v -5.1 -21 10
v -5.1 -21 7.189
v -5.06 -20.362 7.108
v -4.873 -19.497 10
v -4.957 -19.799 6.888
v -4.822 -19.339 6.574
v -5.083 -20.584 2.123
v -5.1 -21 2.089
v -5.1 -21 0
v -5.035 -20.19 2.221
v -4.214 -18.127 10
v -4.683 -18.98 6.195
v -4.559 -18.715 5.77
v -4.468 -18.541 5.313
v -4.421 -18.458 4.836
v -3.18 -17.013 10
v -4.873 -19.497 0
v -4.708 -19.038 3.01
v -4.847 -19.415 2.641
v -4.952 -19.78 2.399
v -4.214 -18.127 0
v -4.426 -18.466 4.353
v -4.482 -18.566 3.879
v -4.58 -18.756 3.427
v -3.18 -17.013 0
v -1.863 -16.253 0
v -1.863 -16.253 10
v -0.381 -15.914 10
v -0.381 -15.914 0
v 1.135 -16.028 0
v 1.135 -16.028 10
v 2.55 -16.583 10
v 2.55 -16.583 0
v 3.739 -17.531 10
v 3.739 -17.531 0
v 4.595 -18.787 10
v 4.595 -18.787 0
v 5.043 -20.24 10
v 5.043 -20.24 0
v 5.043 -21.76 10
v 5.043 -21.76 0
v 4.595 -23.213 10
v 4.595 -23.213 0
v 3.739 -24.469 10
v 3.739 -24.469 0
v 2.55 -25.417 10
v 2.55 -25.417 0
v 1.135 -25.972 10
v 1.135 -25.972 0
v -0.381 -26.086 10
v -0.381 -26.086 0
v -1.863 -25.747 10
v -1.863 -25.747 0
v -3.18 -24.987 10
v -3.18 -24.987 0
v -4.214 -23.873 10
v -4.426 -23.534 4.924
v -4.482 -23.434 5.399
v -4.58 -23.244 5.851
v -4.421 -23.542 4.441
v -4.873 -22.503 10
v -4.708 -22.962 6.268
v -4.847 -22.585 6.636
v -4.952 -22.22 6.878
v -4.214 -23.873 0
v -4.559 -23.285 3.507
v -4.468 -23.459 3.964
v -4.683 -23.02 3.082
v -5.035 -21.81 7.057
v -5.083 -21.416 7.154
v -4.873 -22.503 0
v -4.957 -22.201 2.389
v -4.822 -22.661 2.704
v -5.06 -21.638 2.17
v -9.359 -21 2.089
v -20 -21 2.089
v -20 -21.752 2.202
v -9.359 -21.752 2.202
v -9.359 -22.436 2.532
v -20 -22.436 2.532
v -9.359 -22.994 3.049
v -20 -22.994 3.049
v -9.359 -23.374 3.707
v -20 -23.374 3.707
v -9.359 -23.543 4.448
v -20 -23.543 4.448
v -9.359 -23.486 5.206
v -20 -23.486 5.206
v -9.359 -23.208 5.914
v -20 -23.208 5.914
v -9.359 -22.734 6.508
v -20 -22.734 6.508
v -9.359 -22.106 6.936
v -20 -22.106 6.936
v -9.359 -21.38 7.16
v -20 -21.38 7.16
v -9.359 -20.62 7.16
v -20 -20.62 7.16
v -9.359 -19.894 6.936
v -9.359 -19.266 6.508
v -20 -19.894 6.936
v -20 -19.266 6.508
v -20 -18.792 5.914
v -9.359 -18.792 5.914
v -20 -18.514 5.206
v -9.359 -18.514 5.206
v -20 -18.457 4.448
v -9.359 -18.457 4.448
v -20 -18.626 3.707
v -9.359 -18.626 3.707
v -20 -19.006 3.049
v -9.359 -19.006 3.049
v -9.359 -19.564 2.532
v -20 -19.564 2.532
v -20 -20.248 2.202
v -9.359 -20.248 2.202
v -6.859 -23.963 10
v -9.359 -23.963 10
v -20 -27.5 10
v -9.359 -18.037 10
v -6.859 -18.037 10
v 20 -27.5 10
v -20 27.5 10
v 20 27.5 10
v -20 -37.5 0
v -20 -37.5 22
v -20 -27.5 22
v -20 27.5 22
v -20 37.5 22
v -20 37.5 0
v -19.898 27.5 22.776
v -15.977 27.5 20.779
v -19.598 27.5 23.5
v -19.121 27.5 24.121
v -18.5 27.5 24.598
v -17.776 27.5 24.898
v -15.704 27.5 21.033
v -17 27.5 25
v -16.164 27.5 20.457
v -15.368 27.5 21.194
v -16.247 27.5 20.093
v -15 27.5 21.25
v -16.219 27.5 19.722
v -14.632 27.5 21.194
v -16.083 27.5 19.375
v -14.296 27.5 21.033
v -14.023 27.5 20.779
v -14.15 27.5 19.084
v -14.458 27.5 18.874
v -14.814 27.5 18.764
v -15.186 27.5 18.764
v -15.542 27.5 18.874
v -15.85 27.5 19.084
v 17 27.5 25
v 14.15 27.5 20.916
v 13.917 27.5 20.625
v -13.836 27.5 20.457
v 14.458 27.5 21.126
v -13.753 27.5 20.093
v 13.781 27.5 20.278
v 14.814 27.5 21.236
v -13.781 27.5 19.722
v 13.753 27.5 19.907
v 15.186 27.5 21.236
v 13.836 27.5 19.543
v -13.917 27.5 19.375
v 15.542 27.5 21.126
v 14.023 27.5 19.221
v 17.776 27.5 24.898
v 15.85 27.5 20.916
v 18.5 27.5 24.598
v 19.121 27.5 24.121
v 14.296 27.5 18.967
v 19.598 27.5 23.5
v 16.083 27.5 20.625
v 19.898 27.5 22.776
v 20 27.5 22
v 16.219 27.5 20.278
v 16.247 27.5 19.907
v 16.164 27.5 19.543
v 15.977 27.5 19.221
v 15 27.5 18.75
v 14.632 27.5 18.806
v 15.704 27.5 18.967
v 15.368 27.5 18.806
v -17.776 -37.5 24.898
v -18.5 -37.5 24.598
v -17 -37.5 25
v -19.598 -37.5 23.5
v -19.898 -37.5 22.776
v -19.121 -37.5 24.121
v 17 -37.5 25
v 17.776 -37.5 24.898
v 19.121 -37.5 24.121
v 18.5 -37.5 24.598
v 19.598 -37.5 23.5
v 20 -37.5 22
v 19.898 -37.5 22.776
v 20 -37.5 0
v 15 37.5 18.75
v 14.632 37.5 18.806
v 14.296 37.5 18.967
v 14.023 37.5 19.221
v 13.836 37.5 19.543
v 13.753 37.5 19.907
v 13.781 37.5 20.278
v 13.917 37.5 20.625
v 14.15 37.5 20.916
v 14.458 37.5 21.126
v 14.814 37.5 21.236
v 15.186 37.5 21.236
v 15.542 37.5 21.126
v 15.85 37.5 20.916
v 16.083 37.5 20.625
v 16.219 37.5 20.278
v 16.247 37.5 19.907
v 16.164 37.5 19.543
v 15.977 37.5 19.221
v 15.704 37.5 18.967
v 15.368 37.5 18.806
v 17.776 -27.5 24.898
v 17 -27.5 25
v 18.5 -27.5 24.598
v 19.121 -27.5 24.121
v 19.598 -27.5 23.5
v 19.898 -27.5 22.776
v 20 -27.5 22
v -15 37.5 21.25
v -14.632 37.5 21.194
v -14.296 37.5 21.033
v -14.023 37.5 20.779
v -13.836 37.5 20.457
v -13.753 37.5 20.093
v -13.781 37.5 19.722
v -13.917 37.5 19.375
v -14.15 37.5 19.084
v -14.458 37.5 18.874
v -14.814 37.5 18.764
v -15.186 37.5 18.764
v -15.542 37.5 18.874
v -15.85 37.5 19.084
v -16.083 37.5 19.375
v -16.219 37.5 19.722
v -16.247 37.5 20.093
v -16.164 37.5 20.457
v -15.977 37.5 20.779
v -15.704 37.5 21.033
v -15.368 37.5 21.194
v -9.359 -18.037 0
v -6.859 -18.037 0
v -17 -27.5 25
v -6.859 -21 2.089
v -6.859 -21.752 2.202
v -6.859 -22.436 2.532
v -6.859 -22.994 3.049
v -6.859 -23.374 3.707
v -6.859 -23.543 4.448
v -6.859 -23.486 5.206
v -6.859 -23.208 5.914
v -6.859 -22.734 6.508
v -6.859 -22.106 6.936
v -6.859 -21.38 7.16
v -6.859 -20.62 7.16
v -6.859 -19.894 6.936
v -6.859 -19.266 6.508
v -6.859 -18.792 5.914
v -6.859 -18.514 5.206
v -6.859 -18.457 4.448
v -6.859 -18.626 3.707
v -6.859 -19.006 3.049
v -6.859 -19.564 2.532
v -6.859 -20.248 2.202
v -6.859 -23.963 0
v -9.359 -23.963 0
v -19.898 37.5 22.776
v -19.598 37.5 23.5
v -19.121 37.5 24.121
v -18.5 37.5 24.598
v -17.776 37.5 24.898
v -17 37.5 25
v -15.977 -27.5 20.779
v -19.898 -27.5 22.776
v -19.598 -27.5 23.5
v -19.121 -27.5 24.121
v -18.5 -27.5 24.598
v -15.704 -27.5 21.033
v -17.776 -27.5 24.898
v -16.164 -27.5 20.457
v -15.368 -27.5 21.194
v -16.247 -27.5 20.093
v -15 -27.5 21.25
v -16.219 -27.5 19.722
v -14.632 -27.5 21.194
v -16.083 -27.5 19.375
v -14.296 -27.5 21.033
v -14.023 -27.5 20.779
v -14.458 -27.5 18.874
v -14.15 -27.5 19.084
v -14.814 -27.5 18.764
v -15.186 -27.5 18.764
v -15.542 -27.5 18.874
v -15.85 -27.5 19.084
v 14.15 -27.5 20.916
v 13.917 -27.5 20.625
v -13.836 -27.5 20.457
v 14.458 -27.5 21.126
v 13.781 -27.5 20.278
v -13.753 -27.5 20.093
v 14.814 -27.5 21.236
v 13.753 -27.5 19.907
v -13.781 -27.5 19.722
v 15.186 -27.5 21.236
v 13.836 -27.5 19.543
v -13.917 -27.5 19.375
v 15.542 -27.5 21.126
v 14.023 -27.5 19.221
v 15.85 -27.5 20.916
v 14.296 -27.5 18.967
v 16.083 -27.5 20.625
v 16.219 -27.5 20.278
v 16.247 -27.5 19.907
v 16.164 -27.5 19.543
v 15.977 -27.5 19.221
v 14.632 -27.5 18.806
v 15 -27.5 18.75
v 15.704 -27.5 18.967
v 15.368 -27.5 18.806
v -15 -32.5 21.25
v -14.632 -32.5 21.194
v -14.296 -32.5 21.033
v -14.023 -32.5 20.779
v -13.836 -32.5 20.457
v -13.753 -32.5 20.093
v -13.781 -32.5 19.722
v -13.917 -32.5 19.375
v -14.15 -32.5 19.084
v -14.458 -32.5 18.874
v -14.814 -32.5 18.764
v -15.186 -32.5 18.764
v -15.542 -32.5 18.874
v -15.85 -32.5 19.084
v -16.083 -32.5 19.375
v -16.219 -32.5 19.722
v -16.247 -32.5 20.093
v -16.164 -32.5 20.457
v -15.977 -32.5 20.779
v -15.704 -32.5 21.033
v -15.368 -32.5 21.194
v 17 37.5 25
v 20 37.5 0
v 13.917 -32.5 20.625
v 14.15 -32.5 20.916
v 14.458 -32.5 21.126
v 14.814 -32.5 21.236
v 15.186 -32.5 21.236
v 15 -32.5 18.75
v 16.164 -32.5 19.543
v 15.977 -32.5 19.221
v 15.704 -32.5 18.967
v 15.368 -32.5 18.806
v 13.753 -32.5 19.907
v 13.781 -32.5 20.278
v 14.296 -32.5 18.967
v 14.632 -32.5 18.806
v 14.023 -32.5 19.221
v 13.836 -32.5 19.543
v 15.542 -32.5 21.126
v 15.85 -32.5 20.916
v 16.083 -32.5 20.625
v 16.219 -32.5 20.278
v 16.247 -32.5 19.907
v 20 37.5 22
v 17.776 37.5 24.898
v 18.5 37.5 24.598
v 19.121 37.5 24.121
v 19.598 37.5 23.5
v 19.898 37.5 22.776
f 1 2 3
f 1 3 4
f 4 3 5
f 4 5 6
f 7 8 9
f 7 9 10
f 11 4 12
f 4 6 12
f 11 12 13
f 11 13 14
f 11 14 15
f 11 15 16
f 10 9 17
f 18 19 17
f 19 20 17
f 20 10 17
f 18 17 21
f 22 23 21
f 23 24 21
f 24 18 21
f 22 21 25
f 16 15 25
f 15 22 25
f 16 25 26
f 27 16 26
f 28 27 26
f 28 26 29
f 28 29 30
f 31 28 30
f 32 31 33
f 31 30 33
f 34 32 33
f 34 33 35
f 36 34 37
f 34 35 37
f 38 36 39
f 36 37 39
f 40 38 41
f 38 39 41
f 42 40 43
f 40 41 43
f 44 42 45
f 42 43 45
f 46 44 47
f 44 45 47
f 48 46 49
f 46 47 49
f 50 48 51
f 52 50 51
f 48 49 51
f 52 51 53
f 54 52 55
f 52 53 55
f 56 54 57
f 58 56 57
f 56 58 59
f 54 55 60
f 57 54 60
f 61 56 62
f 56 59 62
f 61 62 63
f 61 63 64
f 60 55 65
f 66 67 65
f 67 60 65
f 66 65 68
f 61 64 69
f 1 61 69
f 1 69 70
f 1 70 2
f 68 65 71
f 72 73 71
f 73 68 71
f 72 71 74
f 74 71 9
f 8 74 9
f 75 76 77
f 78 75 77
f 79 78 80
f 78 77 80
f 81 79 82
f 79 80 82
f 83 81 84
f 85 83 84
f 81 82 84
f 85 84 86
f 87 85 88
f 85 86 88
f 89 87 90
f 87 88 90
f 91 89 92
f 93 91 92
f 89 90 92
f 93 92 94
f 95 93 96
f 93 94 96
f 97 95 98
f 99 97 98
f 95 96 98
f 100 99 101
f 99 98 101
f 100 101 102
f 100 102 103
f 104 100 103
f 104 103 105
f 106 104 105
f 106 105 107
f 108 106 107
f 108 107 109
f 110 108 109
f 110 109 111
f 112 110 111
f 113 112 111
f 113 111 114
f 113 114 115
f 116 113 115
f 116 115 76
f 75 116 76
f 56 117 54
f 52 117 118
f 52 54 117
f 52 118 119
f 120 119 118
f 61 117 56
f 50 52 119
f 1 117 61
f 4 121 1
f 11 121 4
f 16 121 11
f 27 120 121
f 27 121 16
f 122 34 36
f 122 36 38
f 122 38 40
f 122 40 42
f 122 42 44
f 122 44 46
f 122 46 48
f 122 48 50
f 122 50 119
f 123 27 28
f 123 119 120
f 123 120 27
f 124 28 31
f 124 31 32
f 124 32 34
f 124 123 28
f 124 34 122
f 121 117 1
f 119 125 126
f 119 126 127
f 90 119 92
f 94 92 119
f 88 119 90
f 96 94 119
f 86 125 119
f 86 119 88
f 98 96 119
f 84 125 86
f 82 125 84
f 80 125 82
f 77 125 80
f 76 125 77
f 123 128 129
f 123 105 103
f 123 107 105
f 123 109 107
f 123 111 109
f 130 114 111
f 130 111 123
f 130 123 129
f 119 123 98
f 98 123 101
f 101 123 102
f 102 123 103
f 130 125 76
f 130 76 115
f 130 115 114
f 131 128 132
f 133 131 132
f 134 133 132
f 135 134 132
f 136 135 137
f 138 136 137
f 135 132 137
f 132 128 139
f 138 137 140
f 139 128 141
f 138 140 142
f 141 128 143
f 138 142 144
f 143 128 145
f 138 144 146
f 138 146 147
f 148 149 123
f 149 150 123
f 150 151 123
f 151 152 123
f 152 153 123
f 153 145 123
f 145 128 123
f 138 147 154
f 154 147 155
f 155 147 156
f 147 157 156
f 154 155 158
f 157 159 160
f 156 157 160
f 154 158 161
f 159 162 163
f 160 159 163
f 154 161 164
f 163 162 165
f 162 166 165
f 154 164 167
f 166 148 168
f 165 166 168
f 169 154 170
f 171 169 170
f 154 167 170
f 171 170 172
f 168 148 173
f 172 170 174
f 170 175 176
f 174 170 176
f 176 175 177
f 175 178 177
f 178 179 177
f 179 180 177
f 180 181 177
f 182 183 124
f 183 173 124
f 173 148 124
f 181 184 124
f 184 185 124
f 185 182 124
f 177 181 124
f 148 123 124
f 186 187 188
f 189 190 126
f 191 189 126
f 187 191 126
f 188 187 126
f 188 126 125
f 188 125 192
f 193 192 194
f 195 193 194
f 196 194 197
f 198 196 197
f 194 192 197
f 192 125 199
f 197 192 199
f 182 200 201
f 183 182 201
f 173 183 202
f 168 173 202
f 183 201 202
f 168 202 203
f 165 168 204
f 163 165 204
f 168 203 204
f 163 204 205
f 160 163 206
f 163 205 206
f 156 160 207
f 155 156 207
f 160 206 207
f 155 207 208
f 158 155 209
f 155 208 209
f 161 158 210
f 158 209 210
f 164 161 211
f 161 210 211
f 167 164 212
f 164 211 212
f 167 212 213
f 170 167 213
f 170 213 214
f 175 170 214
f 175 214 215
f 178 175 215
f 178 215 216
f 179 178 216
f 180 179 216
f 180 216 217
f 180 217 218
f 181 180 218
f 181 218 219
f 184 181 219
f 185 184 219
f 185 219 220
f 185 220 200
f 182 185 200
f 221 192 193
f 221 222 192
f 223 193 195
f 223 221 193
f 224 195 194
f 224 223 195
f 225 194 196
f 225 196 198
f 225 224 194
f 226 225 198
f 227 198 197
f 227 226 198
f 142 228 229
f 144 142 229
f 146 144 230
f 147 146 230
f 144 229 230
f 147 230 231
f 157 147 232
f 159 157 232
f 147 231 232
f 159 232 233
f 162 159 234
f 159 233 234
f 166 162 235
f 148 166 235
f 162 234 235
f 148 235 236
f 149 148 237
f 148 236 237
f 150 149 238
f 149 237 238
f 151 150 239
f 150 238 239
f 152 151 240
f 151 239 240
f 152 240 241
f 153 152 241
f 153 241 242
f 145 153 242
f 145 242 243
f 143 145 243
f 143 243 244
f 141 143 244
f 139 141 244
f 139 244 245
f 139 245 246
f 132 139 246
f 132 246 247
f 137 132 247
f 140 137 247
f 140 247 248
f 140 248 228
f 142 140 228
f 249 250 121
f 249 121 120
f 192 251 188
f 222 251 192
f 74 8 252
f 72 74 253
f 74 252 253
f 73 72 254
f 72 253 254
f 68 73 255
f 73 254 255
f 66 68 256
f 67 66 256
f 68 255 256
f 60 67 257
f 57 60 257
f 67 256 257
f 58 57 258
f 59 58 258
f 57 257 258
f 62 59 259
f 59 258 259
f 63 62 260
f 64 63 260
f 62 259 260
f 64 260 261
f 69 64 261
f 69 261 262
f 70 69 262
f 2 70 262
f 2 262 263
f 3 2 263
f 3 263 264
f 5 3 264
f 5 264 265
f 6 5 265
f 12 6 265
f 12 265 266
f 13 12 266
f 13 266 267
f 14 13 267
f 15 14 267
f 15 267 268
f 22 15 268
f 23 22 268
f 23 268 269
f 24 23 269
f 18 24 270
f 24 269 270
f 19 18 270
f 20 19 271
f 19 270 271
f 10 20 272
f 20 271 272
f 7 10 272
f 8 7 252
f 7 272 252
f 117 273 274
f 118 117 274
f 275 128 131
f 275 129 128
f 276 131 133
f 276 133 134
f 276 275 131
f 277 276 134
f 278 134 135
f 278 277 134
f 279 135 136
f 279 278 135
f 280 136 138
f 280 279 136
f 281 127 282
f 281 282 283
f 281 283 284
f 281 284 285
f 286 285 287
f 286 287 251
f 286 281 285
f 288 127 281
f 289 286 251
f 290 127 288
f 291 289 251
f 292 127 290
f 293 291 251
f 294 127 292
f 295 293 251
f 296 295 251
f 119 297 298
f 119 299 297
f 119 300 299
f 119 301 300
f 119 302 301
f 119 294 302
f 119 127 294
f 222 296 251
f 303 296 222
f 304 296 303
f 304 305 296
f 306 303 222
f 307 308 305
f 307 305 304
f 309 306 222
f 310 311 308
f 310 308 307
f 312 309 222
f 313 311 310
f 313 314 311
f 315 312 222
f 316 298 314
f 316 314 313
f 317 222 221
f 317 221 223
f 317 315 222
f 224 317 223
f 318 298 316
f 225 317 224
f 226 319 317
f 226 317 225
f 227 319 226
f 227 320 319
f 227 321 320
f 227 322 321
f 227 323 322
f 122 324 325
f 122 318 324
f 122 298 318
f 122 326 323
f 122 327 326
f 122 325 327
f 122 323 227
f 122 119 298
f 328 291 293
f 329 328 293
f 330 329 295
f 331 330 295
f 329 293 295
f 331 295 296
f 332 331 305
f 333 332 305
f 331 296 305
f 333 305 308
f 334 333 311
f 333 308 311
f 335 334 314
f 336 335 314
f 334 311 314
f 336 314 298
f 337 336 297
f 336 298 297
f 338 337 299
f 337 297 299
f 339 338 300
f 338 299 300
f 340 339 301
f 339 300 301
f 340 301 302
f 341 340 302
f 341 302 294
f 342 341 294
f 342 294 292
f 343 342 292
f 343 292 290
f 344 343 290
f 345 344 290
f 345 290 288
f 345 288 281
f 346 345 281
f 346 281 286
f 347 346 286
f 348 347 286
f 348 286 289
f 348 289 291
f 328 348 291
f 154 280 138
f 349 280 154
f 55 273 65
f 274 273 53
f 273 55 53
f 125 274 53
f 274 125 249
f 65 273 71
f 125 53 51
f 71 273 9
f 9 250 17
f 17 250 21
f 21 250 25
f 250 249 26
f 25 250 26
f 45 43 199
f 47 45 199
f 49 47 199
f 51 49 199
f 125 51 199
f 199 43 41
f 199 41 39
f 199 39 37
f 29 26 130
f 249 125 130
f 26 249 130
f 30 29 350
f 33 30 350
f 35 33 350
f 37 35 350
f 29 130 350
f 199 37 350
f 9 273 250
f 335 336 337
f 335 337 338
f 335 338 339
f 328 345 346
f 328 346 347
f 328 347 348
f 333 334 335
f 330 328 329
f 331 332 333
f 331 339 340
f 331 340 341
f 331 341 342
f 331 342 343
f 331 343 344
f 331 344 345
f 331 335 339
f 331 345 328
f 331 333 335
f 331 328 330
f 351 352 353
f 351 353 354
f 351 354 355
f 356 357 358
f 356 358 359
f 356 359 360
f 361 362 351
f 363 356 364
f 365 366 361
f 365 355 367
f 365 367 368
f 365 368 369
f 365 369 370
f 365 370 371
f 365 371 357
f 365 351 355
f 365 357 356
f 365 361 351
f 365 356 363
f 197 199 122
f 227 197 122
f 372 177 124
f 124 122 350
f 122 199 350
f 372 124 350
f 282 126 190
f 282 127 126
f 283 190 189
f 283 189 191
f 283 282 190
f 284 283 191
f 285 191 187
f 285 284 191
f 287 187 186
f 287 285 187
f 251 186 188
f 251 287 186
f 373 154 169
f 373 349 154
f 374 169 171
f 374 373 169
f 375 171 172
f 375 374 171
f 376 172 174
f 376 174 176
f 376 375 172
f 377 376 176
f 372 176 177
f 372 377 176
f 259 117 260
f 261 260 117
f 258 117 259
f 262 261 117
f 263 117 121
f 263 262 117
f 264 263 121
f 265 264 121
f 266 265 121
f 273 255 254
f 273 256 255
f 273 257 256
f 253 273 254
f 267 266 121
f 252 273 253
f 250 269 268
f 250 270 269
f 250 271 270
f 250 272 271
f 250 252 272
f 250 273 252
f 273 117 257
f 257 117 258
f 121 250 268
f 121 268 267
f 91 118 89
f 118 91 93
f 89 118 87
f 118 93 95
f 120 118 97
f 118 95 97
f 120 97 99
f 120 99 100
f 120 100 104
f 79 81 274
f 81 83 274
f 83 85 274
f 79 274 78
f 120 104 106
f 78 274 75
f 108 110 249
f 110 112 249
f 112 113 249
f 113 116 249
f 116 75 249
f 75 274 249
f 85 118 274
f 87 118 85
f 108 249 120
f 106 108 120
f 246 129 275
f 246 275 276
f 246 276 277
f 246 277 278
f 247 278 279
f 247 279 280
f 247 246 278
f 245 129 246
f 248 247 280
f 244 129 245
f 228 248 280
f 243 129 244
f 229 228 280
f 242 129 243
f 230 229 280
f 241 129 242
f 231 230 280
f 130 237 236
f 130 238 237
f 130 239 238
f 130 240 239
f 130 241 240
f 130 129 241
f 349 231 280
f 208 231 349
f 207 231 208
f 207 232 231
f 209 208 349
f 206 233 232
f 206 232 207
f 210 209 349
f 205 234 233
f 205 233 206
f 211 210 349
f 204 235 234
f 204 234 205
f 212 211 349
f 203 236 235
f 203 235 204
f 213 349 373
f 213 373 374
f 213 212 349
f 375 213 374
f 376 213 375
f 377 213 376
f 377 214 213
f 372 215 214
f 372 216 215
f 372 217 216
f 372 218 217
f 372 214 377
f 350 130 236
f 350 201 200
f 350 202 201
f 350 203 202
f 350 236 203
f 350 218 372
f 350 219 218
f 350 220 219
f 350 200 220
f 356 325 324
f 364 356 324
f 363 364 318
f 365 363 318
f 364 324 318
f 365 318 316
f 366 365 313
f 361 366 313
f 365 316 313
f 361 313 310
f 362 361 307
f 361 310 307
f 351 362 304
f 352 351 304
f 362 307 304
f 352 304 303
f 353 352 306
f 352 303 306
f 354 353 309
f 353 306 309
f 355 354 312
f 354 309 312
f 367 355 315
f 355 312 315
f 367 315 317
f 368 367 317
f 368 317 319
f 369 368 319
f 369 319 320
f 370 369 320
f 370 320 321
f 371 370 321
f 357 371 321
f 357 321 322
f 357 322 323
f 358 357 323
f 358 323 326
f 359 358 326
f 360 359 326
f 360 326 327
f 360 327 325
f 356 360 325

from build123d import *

# Parameters (mm, degrees)
SKETCH1_W                           = 40
SKETCH1_H                           = 75
BOSS_EXTRUDE1_DEPTH                 = 10
SKETCH2_W                           = 40
SKETCH2_H                           = 10
BOSS_EXTRUDE2_DEPTH                 = 15
SKETCH3_R                           = 1.25
CUT_EXTRUDE1_DEPTH                  = 70
FILLET1_R                           = 3
FILLET2_R                           = 3
SKETCH4_R                           = 5.1
CUT_EXTRUDE2_DEPTH                  = 10
ENL_V_MAT_EXTRU_1_REACH             = 62.26
ENL_V_MAT_EXTRU_1_END_RADIUS        = 5.1
ESQUISSE1_R                         = 2.55
ENL_V_MAT_EXTRU_1_DIRECTION_2_DEPTH = 61.259853966
ESQUISSE2_W                         = 2.5
ESQUISSE2_H                         = 5.92504729
ENL_V_MAT_EXTRU_2_DEPTH             = 50.307707349


with BuildPart() as part:
    # Sketch1 → Boss-Extrude1 (new body)
    with BuildSketch(Plane.XY):
        Rectangle(SKETCH1_W, SKETCH1_H)
    extrude(amount=BOSS_EXTRUDE1_DEPTH)

    # Sketch2 → Boss-Extrude2 (add)
    with BuildSketch(Plane.XY.offset(10)):
        with Locations((0, 32.5)):
            Rectangle(SKETCH2_W, SKETCH2_H)
        with Locations((0, -32.5)):
            Rectangle(SKETCH2_W, SKETCH2_H)
    extrude(amount=BOSS_EXTRUDE2_DEPTH)

    # Sketch3 → Cut-Extrude1 (cut)
    with BuildSketch(Plane(origin=(0, 37.5, 0), x_dir=(1, 0, 0), z_dir=(0, 1, 0))):
        with Locations(Location((-15, -20, 0), (0, 0, 270))):
            Circle(SKETCH3_R)
        with Locations(Location((15, -20, 0), (0, 0, 90))):
            Circle(SKETCH3_R)
    extrude(amount=-CUT_EXTRUDE1_DEPTH, mode=Mode.SUBTRACT)

    # Fillet1
    fillet1_edges = [part.edges().sort_by_distance(p)[0] for p in [
        (-20, 32.5, 25),
        (20, 32.5, 25),
    ]]
    fillet(fillet1_edges, radius=FILLET1_R)

    # Fillet2
    fillet2_edges = [part.edges().sort_by_distance(p)[0] for p in [
        (-20, -32.5, 25),
        (20, -32.5, 25),
    ]]
    fillet(fillet2_edges, radius=FILLET2_R)

    # Sketch4 → Cut-Extrude2 (cut)
    with BuildSketch(Plane(origin=(0, 0, 0), x_dir=(-1, 0, 0), z_dir=(0, 0, -1))):
        with Locations((0, -21)):
            Circle(SKETCH4_R)
    extrude(amount=-CUT_EXTRUDE2_DEPTH, mode=Mode.SUBTRACT)

    # Enlèv. mat.-Extru.1: up to this cylinder (the profile starts outside it)
    enl_v_mat_extru_1_end = Plane(origin=(0, -21, 4.63857), z_dir=(0, 0, -1)) * Cylinder(ENL_V_MAT_EXTRU_1_END_RADIUS, 135.72, mode=Mode.PRIVATE)
    # Esquisse1 → Enlèv. mat.-Extru.1 (cut, up to the surface)
    with BuildSketch(Plane.ZY.offset(20), mode=Mode.PRIVATE) as enl_v_mat_extru_1_sk1:
        with Locations(Location((4.63857049, -21, 0), (0, 0, 180))):
            Circle(ESQUISSE1_R)
    enl_v_mat_extru_1_tool1 = extrude(enl_v_mat_extru_1_sk1.sketch, amount=-ENL_V_MAT_EXTRU_1_REACH, mode=Mode.PRIVATE) - enl_v_mat_extru_1_end
    add(enl_v_mat_extru_1_tool1.solids().sort_by_distance((-20, -21, 4.63857))[0], mode=Mode.SUBTRACT)

    # Esquisse1 → Enlèv. mat.-Extru.1 direction 2 (cut)
    with BuildSketch(Plane.ZY.offset(20)):
        with Locations(Location((4.63857049, -21, 0), (0, 0, 180))):
            Circle(ESQUISSE1_R)
    extrude(amount=ENL_V_MAT_EXTRU_1_DIRECTION_2_DEPTH, mode=Mode.SUBTRACT)

    # Esquisse2 → Enlèv. mat.-Extru.2 (cut, through all)
    with BuildSketch(Plane(origin=(0, 0, 0), x_dir=(-1, 0, 0), z_dir=(0, 0, -1))):
        with Locations((8.108583092, -21)):
            Rectangle(ESQUISSE2_W, ESQUISSE2_H)
    extrude(amount=-ENL_V_MAT_EXTRU_2_DEPTH, mode=Mode.SUBTRACT)


solid = part.part
